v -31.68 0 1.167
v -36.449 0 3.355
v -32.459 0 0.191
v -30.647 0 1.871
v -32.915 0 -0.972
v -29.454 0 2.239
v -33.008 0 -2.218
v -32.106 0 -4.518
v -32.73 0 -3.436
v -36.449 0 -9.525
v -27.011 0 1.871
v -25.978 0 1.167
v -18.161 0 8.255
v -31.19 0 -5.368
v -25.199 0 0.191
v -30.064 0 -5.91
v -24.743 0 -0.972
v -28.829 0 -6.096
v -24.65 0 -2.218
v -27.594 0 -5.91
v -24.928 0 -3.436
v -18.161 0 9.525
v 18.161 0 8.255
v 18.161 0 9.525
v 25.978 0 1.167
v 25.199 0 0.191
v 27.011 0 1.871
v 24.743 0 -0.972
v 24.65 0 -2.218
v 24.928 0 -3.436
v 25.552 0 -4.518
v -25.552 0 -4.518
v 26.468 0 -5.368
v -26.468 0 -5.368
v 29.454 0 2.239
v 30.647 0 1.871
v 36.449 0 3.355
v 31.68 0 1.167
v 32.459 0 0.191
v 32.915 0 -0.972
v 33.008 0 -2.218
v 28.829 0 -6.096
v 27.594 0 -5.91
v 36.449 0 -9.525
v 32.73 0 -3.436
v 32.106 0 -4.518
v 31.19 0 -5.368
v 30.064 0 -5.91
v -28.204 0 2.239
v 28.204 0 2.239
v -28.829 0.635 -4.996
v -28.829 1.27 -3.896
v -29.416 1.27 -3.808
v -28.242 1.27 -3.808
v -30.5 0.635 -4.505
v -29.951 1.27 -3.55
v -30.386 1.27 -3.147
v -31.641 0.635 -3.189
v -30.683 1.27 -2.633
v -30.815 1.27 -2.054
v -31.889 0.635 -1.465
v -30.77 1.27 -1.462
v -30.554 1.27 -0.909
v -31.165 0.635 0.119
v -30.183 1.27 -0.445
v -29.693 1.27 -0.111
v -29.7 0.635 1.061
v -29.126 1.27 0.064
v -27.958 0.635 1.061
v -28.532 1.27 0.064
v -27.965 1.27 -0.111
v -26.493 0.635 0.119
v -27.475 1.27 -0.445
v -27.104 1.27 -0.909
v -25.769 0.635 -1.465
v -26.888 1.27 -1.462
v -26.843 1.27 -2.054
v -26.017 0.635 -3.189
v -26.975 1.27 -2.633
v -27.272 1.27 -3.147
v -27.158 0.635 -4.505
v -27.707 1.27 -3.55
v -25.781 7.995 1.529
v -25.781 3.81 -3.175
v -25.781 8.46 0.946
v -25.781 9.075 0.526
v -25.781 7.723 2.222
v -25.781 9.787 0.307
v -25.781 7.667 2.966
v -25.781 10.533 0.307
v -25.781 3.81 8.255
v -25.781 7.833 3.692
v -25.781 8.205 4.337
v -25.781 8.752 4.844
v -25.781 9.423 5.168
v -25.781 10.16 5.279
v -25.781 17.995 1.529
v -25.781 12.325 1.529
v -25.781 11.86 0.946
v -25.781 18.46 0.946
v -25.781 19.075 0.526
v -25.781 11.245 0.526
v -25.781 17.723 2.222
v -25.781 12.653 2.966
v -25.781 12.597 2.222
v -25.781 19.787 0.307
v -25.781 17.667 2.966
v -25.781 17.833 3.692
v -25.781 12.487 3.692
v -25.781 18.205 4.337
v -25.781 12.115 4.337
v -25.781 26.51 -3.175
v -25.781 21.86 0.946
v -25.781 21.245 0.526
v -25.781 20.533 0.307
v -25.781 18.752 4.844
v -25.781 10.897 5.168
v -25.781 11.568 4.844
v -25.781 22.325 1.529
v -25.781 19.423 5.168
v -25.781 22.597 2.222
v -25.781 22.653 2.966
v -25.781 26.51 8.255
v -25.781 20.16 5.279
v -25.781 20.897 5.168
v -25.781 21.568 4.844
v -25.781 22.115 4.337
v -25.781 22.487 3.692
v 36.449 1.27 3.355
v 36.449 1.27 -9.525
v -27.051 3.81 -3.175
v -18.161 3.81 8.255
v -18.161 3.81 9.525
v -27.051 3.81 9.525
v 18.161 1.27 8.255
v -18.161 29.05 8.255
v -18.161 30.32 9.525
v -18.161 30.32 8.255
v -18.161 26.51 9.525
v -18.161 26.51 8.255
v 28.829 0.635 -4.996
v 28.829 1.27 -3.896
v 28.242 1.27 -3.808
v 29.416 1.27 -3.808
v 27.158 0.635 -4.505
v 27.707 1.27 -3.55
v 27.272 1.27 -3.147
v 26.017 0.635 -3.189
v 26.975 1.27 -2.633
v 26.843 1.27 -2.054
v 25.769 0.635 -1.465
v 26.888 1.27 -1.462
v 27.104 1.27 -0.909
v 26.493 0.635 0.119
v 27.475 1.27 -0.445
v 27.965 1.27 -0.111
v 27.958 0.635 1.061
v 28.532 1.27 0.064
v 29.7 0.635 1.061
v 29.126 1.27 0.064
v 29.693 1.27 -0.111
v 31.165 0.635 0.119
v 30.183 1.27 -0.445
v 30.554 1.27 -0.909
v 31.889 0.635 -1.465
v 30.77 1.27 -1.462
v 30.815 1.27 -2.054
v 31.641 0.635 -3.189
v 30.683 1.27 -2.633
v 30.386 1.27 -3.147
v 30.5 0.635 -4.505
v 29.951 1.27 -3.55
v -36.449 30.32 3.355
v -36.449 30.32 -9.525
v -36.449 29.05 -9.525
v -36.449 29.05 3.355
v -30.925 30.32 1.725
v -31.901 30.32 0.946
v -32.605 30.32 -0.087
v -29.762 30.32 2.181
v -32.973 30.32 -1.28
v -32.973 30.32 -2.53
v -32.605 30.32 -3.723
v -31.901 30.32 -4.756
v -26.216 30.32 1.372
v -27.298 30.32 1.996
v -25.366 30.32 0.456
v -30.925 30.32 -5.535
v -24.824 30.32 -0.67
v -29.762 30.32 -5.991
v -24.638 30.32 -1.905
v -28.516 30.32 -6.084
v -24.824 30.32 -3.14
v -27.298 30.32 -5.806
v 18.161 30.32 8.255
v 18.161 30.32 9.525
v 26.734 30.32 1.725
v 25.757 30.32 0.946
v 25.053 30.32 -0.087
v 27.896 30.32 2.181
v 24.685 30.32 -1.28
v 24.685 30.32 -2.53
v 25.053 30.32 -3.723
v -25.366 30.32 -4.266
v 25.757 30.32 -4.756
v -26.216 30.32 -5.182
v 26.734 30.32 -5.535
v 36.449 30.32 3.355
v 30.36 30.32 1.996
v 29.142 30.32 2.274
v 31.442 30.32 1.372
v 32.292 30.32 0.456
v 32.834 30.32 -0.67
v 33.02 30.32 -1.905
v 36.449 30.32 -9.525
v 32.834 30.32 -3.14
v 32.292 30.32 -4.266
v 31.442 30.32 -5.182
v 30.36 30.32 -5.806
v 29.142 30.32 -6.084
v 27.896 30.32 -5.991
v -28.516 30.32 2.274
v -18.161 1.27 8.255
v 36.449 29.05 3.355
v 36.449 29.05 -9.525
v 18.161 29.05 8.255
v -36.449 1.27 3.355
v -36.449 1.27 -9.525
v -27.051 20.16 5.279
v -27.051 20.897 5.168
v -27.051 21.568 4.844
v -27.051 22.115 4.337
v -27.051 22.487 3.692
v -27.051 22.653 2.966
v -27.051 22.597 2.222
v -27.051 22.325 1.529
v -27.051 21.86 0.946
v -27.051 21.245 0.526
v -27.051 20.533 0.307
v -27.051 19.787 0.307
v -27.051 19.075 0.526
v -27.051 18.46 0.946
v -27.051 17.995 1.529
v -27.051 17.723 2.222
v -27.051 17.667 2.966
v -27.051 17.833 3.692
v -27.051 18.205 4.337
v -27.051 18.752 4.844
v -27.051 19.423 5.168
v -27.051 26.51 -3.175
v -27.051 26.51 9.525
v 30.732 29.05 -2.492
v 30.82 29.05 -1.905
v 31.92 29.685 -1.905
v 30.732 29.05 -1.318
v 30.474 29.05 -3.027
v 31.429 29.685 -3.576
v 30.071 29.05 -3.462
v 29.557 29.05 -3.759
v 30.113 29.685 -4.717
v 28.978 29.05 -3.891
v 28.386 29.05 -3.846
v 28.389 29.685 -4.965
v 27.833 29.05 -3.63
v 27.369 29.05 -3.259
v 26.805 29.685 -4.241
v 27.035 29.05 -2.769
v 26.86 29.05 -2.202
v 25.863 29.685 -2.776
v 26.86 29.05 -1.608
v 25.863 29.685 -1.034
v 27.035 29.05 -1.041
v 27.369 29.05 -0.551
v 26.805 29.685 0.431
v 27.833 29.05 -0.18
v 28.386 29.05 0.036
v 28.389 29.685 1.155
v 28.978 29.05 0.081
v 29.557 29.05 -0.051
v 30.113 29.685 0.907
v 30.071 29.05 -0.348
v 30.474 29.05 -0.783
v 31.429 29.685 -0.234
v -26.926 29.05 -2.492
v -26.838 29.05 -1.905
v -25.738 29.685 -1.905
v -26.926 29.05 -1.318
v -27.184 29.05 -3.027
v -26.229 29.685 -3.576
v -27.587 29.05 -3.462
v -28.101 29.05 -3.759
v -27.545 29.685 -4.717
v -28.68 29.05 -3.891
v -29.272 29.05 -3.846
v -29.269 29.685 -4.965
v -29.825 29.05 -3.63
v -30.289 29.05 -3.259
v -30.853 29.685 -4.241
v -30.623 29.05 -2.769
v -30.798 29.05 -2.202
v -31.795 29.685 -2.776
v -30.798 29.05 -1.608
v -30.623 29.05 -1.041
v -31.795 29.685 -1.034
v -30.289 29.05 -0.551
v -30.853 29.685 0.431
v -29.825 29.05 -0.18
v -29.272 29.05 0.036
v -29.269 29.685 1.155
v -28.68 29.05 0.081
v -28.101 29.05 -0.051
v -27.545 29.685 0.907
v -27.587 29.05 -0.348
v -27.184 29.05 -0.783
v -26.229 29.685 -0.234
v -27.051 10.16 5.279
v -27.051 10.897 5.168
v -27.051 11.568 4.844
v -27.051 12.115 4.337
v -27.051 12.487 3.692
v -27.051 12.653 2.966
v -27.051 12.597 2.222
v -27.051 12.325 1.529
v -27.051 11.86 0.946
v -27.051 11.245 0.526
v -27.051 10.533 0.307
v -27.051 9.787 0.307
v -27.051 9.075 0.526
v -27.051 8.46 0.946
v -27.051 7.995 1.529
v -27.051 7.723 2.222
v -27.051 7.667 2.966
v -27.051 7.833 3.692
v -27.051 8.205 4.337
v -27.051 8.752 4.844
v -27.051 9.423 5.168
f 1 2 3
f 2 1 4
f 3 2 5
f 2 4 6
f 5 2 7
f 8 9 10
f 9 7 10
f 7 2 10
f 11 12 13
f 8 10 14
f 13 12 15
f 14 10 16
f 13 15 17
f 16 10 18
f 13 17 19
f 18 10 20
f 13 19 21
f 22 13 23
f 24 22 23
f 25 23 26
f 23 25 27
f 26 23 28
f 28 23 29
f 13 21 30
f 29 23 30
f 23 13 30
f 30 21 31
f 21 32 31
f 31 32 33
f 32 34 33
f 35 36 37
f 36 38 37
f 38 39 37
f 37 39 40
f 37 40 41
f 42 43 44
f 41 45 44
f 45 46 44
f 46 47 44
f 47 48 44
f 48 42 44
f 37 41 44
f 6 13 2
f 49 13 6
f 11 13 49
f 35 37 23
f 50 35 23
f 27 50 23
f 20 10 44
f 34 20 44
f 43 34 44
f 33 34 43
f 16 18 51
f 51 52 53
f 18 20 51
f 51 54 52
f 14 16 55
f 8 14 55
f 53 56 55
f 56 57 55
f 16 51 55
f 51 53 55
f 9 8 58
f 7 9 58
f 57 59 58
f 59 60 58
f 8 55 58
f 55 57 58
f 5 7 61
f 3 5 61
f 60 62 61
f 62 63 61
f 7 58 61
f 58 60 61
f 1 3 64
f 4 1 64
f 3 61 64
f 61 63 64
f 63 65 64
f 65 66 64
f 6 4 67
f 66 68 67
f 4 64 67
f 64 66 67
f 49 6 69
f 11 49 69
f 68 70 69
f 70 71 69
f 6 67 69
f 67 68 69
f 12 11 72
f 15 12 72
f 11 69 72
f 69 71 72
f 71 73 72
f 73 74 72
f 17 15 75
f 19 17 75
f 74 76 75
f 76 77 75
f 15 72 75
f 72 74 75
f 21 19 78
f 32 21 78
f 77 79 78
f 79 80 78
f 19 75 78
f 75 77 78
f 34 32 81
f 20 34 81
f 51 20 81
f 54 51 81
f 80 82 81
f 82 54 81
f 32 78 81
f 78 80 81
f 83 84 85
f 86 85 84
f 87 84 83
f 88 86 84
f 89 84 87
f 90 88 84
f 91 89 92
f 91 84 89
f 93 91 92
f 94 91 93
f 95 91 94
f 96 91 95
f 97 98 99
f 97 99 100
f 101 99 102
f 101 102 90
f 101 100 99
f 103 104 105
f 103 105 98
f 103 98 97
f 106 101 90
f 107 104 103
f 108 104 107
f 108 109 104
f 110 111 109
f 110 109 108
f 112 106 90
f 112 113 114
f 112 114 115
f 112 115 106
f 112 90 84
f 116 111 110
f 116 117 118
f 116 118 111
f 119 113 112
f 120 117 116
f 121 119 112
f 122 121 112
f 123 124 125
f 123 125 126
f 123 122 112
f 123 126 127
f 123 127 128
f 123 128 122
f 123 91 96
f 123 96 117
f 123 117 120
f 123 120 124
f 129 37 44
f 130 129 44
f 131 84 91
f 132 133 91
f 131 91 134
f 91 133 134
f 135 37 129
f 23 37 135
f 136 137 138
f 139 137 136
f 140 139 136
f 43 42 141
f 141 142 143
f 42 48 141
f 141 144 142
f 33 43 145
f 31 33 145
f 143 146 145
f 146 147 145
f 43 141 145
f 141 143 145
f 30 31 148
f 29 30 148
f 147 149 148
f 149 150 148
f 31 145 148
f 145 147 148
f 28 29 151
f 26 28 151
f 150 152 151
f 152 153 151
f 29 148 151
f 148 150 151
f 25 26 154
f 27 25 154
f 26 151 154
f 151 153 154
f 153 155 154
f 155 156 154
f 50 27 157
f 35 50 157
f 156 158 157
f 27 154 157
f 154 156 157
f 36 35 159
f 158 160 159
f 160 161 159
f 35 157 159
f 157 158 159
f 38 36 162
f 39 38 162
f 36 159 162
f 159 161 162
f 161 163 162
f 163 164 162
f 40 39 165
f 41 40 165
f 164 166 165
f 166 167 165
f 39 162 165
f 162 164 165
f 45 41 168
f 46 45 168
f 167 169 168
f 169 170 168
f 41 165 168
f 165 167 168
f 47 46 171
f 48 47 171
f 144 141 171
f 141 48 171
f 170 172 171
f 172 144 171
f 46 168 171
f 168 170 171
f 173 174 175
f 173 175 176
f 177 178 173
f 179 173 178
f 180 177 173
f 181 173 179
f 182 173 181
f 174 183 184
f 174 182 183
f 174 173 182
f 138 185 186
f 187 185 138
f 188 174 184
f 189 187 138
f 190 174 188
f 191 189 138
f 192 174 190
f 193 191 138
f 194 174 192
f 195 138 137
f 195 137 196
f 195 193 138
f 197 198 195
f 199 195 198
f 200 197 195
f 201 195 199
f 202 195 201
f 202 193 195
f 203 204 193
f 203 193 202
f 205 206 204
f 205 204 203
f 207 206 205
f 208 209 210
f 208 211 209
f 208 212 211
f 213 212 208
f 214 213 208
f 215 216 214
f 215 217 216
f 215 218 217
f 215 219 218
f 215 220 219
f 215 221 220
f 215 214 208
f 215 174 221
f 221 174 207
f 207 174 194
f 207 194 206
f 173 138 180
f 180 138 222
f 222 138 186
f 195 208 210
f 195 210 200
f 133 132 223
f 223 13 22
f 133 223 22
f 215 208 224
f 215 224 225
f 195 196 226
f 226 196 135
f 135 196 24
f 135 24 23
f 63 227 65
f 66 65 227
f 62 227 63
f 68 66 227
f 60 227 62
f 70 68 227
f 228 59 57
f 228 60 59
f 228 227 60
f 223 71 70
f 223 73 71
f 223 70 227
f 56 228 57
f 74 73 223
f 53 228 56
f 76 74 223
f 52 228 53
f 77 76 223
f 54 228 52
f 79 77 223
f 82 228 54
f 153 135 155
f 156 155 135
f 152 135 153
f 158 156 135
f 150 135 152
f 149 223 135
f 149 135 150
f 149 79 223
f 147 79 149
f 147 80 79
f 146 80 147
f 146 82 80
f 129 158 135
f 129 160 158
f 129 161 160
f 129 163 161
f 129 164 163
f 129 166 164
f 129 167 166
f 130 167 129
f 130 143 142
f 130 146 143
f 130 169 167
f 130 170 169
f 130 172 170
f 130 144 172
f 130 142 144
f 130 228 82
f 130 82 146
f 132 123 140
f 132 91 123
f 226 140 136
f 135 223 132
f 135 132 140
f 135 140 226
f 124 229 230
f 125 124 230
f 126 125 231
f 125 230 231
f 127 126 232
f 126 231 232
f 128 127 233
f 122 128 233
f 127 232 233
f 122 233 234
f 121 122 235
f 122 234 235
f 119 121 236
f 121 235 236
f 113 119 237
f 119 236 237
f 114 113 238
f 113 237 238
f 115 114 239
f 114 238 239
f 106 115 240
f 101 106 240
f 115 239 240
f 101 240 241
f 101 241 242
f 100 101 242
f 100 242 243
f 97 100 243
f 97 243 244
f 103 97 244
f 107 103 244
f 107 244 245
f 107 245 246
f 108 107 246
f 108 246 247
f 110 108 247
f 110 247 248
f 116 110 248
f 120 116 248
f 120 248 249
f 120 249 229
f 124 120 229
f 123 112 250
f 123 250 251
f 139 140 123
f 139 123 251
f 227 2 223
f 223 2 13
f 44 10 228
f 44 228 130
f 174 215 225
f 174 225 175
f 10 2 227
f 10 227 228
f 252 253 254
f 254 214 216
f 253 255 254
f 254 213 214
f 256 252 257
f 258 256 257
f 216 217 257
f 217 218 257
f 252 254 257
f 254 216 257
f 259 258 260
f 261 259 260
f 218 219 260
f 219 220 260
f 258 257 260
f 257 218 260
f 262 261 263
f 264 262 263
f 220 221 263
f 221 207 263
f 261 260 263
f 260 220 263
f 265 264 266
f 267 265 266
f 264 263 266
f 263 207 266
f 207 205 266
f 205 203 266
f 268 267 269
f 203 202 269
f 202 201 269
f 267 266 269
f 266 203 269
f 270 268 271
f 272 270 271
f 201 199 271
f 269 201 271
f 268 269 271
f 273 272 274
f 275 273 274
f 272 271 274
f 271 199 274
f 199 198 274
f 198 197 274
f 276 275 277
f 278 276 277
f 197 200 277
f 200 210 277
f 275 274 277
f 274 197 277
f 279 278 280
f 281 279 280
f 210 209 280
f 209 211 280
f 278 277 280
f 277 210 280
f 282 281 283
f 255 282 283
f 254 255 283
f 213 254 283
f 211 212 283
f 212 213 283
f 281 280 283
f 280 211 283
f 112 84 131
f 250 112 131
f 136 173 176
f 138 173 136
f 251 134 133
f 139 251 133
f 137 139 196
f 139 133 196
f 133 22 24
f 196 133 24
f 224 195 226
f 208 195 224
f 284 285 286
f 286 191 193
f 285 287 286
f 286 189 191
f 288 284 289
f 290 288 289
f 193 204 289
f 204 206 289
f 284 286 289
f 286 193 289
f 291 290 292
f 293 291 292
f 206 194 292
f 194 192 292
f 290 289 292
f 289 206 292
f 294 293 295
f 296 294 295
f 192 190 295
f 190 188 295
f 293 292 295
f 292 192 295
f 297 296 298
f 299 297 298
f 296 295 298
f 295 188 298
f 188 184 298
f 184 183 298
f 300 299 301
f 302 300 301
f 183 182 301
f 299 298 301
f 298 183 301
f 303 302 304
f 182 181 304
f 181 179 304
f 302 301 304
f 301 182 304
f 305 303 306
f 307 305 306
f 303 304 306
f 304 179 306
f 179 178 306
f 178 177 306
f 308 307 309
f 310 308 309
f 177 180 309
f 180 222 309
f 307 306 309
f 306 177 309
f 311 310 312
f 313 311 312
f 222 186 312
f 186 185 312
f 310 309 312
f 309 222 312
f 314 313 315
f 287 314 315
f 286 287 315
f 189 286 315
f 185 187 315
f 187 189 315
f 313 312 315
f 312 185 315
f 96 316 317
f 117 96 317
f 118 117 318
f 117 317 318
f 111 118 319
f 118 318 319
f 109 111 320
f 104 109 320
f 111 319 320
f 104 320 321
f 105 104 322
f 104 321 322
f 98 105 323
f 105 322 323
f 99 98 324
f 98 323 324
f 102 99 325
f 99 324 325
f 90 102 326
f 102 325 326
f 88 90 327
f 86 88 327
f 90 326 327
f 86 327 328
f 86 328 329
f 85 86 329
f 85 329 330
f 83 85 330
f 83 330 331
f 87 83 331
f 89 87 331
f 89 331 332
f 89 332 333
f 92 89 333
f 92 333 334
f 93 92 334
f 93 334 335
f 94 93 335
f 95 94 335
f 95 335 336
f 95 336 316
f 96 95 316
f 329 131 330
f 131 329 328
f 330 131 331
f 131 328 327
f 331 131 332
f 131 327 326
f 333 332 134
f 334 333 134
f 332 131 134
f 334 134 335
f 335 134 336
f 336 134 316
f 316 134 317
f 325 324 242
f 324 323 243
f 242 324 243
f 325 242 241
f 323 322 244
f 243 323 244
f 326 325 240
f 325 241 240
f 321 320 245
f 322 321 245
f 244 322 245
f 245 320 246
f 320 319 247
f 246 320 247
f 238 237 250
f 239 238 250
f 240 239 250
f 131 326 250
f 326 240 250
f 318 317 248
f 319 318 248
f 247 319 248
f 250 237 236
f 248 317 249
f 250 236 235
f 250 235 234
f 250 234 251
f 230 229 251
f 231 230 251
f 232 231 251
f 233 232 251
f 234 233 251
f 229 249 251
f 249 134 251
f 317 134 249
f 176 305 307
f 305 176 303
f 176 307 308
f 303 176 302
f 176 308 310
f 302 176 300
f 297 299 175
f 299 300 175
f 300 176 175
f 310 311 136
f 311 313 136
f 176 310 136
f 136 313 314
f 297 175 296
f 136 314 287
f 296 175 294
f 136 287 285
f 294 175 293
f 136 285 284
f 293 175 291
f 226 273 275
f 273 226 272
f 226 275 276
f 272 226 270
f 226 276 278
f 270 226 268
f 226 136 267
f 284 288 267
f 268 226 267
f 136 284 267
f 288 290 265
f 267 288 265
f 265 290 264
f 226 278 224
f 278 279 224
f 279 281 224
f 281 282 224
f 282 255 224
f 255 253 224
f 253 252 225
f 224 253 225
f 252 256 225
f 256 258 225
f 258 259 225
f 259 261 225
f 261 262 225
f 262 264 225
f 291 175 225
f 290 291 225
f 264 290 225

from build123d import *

# Parameters (mm, degrees)
SKETCH1_W                    = 72.898
SKETCH1_H                    = 19.05
SKETCH1_R                    = 4.191
BOSS_EXTRUDE1_DEPTH          = 1.27
SKETCH7_W                    = 72.898
SKETCH7_H                    = 1.27
BOSS_EXTRUDE4_DEPTH          = 30.48
CUT_EXTRUDE2_DEPTH           = 50.267816331
SKETCH10_W                   = 1.27
SKETCH10_H                   = 27.94
BOSS_EXTRUDE5_DEPTH          = 8.89
SKETCH11_W                   = 1.27
SKETCH11_H                   = 27.94
BOSS_EXTRUDE6_DEPTH          = 11.43
SKETCH12_R                   = 2.5
CUT_EXTRUDE3_DEPTH           = 72.631264997
CUT_EXTRUDE5_DEPTH           = 72.631264997
CUT_EXTRUDE5_DEPTH_BACK      = 72.631264997
SKETCH14_W                   = 12.7
SKETCH14_H                   = 5.24
SKETCH15_W                   = 36.322
SKETCH15_H                   = 1.27
BOSS_EXTRUDE8_DEPTH          = 3.81
BOSS_EXTRUDE9_START          = 29.05
BOSS_EXTRUDE9_DEPTH          = 1.27
SKETCH17_R                   = 4.191
CUT_EXTRUDE6_DEPTH           = 1.27
CUT_EXTRUDE6_DRAFT           = -60
CUT_EXTRUDE6_PROFILE_2_DEPTH = 1.27
CUT_EXTRUDE6_PROFILE_2_DRAFT = -60


with BuildPart() as part:
    # Sketch1 → Boss-Extrude1 (new body)
    # profile 1 of 3: a face of its own
    with BuildSketch(Plane(origin=(0, 0, 0), x_dir=(1, 0, 0), z_dir=(0, 1, 0))):
        Rectangle(SKETCH1_W, SKETCH1_H)
        with Locations((28.829, 1.905)):
            Circle(SKETCH1_R, mode=Mode.SUBTRACT)
        with Locations((-28.829, 1.905)):
            Circle(SKETCH1_R, mode=Mode.SUBTRACT)
    # profile 2 of 3: a face of its own
    with BuildSketch(Plane(origin=(0, 0, 0), x_dir=(1, 0, 0), z_dir=(0, 1, 0))):
        with Locations((28.829, 1.905)):
            Circle(SKETCH1_R)
    # profile 3 of 3: a face of its own
    with BuildSketch(Plane(origin=(0, 0, 0), x_dir=(1, 0, 0), z_dir=(0, 1, 0))):
        with Locations((-28.829, 1.905)):
            Circle(SKETCH1_R)
    extrude(amount=BOSS_EXTRUDE1_DEPTH)

    # Cut-Extrude1 cone 1 section (through the dimple's axis) → Cut-Extrude1 (revolve, cut)
    with BuildSketch(Plane(origin=(-28.829, 0, -1.905), x_dir=(0, 0, -1), z_dir=(1, 0, 0))):
        Polygon((0, 0), (4.191, 0), (0, 2.419674978), align=None)
    revolve(axis=Axis((-28.829, 0, -1.905), (0, 1, 0)), mode=Mode.SUBTRACT)

    # Cut-Extrude1 cone 2 section (through the dimple's axis) → Cut-Extrude1 cone 2 (revolve, cut)
    with BuildSketch(Plane(origin=(28.829, 0, -1.905), x_dir=(0, 0, -1), z_dir=(1, 0, 0))):
        Polygon((0, 0), (4.191, 0), (0, 2.419674978), align=None)
    revolve(axis=Axis((28.829, 0, -1.905), (0, 1, 0)), mode=Mode.SUBTRACT)

    # Sketch7 → Boss-Extrude4 (add)
    with BuildSketch(Plane(origin=(0, 1.27, 0), x_dir=(1, 0, 0), z_dir=(0, 1, 0))):
        with Locations((0, -8.89)):
            Rectangle(SKETCH7_W, SKETCH7_H)
    extrude(amount=BOSS_EXTRUDE4_DEPTH)

    # Sketch8 → Cut-Extrude2 (cut, symmetric)
    with BuildSketch(Plane.XZ):
        Polygon((-36.449, 9.525), (-36.449, 3.354745169), (-18.161, 8.255), (-18.161, 9.525), align=None)
    cut_extrude2 = extrude(amount=CUT_EXTRUDE2_DEPTH, both=True, mode=Mode.SUBTRACT)

    # Mirror2: Cut-Extrude2 across plane
    add(cut_extrude2.mirror(Plane.ZY), mode=Mode.SUBTRACT)

    # Sketch10 → Boss-Extrude5 (add)
    with BuildSketch(Plane.ZY.offset(18.161)):
        with Locations((8.89, 17.78)):
            Rectangle(SKETCH10_W, SKETCH10_H)
    extrude(amount=BOSS_EXTRUDE5_DEPTH)

    # Sketch11 → Boss-Extrude6 (add)
    with BuildSketch(Plane(origin=(0, 0, 8.255), x_dir=(-1, 0, 0), z_dir=(0, 0, -1))):
        with Locations((26.416, 17.78)):
            Rectangle(SKETCH11_W, SKETCH11_H)
    extrude(amount=BOSS_EXTRUDE6_DEPTH)

    # Sketch12 → Cut-Extrude3 (cut, through all)
    with BuildSketch(Plane.ZY.offset(27.051)):
        with Locations((2.77876, 10.16)):
            Circle(SKETCH12_R)
        with Locations((2.77876, 20.16)):
            Circle(SKETCH12_R)
    extrude(amount=-CUT_EXTRUDE3_DEPTH, mode=Mode.SUBTRACT)

    # Sketch14 → Cut-Extrude5 (cut, two sides: drawn at the far end of the back side and taken through both)
    with BuildSketch(Plane.ZY.offset(27.051).offset(-CUT_EXTRUDE5_DEPTH_BACK)):
        with Locations((3.175, 29.13)):
            Rectangle(SKETCH14_W, SKETCH14_H)
    extrude(amount=CUT_EXTRUDE5_DEPTH + CUT_EXTRUDE5_DEPTH_BACK, mode=Mode.SUBTRACT)

    # Sketch15 → Boss-Extrude8 (add)
    with BuildSketch(Plane(origin=(0, 26.51, 0), x_dir=(1, 0, 0), z_dir=(0, 1, 0))):
        with Locations((0, -8.89)):
            Rectangle(SKETCH15_W, SKETCH15_H)
    extrude(amount=BOSS_EXTRUDE8_DEPTH)

    # Sketch16 → Boss-Extrude9 (add)
    with BuildSketch(Plane(origin=(0, 1.27, 0), x_dir=(1, 0, 0), z_dir=(0, 1, 0)).offset(BOSS_EXTRUDE9_START)):
        Polygon((-36.449, 9.525), (-36.449, -3.354745169), (-18.161, -8.255), (-18.161, -9.525), (18.161, -9.525), (18.161, -8.255), (36.449, -3.354745169), (36.449, 9.525), align=None)
    extrude(amount=-BOSS_EXTRUDE9_DEPTH)


with BuildPart() as cut_extrude6_tool:
    # Sketch17 → Cut-Extrude6 (with draft: the straight prism first)
    with BuildSketch(Plane(origin=(0, 30.32, 0), x_dir=(1, 0, 0), z_dir=(0, 1, 0))):
        with Locations((-28.829, 1.905)):
            Circle(SKETCH17_R)
    extrude(amount=-CUT_EXTRUDE6_DEPTH)
    # Cut-Extrude6: the draft: its side faces are tilted about the plane it starts from
    cut_extrude6_sides = [cut_extrude6_tool.faces().sort_by_distance(p)[0] for p in [
        (-33.02, 29.685, -1.905),
    ]]
    draft(cut_extrude6_sides, Plane(origin=(0, 30.32, 0), x_dir=(1, 0, 0), z_dir=(0, 1, 0)), CUT_EXTRUDE6_DRAFT)


with BuildPart() as part_1:
    add(part.part)

    # Cut-Extrude6: cut by cut_extrude6_tool
    add(cut_extrude6_tool.part, mode=Mode.SUBTRACT)


with BuildPart() as cut_extrude6_profile_2_tool:
    # Sketch17 → Cut-Extrude6 profile 2 (with draft: the straight prism first)
    with BuildSketch(Plane(origin=(0, 30.32, 0), x_dir=(1, 0, 0), z_dir=(0, 1, 0))):
        with Locations((28.829, 1.905)):
            Circle(SKETCH17_R)
    extrude(amount=-CUT_EXTRUDE6_PROFILE_2_DEPTH)
    # Cut-Extrude6 profile 2: the draft: its side faces are tilted about the plane it starts from
    cut_extrude6_profile_2_sides = [cut_extrude6_profile_2_tool.faces().sort_by_distance(p)[0] for p in [
        (24.638, 29.685, -1.905),
    ]]
    draft(cut_extrude6_profile_2_sides, Plane(origin=(0, 30.32, 0), x_dir=(1, 0, 0), z_dir=(0, 1, 0)), CUT_EXTRUDE6_PROFILE_2_DRAFT)


with BuildPart() as part_2:
    add(part_1.part)

    # Cut-Extrude6 profile 2: cut by cut_extrude6_profile_2_tool
    add(cut_extrude6_profile_2_tool.part, mode=Mode.SUBTRACT)


solid = part_2.part
